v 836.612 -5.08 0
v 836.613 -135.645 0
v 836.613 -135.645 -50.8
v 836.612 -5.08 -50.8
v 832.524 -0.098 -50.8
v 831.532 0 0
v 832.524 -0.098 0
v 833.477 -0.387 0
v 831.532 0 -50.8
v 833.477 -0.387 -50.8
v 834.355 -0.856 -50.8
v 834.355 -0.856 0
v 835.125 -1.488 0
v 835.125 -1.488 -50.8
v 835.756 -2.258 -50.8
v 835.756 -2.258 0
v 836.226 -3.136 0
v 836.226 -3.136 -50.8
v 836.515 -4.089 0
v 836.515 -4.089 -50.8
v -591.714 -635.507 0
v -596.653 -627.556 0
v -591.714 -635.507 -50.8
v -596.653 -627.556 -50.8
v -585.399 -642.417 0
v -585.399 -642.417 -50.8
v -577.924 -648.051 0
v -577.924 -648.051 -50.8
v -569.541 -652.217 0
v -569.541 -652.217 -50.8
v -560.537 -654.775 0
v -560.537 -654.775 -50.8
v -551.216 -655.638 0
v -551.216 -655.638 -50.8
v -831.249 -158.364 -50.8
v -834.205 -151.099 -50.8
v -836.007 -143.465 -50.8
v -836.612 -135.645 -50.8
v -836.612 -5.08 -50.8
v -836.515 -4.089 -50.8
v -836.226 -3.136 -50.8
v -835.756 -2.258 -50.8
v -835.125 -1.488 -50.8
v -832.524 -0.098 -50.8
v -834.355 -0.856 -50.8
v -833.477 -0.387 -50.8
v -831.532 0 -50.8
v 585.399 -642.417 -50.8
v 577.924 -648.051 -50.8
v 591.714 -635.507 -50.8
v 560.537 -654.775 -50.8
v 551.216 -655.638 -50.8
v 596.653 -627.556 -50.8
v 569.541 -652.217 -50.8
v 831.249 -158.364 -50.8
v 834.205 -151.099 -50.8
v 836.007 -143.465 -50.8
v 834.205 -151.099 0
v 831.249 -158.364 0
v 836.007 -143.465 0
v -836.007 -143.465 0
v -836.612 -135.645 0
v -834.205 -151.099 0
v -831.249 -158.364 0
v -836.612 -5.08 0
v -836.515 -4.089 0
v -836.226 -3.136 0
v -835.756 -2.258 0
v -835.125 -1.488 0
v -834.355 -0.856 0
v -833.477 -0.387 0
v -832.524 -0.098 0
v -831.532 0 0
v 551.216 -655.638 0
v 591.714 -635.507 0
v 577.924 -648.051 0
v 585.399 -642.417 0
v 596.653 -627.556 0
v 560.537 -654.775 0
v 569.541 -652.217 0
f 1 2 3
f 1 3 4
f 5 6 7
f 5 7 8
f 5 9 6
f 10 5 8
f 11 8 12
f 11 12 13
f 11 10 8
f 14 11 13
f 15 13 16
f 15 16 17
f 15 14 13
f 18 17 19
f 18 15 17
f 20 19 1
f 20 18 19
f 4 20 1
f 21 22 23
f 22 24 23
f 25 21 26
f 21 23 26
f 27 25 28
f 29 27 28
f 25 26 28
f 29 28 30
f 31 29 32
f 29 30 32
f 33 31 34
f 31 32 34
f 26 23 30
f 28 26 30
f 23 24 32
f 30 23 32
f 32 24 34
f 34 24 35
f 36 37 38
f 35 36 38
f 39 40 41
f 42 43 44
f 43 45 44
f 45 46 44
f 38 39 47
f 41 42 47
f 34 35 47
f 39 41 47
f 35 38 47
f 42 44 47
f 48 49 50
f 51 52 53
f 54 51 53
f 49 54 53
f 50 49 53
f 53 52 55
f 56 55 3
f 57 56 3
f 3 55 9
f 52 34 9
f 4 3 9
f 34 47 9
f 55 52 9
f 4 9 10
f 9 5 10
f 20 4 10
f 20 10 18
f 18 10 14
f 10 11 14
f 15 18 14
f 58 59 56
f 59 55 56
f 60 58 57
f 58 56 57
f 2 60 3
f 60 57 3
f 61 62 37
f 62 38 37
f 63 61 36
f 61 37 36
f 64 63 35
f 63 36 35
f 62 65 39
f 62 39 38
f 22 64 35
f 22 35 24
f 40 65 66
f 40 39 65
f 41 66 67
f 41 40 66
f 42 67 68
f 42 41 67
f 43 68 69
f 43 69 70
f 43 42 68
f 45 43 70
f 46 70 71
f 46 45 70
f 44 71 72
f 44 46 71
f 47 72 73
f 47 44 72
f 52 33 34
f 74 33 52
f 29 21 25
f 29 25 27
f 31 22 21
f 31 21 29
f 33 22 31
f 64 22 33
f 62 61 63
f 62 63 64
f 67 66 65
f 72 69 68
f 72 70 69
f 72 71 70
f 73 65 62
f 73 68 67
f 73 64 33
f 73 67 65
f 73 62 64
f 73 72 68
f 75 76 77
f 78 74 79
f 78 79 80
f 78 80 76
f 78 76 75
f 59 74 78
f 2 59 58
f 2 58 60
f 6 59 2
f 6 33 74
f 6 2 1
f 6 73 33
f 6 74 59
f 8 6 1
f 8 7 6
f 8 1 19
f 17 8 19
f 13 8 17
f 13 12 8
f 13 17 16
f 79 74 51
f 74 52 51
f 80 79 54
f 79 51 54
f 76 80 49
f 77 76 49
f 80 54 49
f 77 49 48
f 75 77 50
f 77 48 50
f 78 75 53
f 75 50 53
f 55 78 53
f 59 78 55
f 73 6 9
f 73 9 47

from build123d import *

# Parameters (mm, degrees)
F1_DEPTH = 50.8
F2_R     = 50.8
F3_R     = 5.08


with BuildPart() as f1:
    # F0 (on Top) → F1 (new body)
    with BuildSketch(Plane.XY):
        Polygon((836.6125, 0), (-836.6125, 0), (-836.6125, -147.6375), (-582.6125, -655.6375), (582.6125, -655.6375), (836.6125, -147.6375), align=None)
    extrude(amount=-F1_DEPTH)

    # F2
    f2_edges = [f1.edges().sort_by_distance(p)[0] for p in [
        (-836.6125, -147.6375, -25.4),
        (-582.6125, -655.6375, -25.4),
        (582.6125, -655.6375, -25.4),
        (836.6125, -147.6375, -25.4),
    ]]
    fillet(f2_edges, radius=F2_R)

    # F3
    f3_edges = [f1.edges().sort_by_distance(p)[0] for p in [
        (836.6125, 0, -25.4),
        (-836.6125, 0, -25.4),
    ]]
    fillet(f3_edges, radius=F3_R)


solid = f1.part
